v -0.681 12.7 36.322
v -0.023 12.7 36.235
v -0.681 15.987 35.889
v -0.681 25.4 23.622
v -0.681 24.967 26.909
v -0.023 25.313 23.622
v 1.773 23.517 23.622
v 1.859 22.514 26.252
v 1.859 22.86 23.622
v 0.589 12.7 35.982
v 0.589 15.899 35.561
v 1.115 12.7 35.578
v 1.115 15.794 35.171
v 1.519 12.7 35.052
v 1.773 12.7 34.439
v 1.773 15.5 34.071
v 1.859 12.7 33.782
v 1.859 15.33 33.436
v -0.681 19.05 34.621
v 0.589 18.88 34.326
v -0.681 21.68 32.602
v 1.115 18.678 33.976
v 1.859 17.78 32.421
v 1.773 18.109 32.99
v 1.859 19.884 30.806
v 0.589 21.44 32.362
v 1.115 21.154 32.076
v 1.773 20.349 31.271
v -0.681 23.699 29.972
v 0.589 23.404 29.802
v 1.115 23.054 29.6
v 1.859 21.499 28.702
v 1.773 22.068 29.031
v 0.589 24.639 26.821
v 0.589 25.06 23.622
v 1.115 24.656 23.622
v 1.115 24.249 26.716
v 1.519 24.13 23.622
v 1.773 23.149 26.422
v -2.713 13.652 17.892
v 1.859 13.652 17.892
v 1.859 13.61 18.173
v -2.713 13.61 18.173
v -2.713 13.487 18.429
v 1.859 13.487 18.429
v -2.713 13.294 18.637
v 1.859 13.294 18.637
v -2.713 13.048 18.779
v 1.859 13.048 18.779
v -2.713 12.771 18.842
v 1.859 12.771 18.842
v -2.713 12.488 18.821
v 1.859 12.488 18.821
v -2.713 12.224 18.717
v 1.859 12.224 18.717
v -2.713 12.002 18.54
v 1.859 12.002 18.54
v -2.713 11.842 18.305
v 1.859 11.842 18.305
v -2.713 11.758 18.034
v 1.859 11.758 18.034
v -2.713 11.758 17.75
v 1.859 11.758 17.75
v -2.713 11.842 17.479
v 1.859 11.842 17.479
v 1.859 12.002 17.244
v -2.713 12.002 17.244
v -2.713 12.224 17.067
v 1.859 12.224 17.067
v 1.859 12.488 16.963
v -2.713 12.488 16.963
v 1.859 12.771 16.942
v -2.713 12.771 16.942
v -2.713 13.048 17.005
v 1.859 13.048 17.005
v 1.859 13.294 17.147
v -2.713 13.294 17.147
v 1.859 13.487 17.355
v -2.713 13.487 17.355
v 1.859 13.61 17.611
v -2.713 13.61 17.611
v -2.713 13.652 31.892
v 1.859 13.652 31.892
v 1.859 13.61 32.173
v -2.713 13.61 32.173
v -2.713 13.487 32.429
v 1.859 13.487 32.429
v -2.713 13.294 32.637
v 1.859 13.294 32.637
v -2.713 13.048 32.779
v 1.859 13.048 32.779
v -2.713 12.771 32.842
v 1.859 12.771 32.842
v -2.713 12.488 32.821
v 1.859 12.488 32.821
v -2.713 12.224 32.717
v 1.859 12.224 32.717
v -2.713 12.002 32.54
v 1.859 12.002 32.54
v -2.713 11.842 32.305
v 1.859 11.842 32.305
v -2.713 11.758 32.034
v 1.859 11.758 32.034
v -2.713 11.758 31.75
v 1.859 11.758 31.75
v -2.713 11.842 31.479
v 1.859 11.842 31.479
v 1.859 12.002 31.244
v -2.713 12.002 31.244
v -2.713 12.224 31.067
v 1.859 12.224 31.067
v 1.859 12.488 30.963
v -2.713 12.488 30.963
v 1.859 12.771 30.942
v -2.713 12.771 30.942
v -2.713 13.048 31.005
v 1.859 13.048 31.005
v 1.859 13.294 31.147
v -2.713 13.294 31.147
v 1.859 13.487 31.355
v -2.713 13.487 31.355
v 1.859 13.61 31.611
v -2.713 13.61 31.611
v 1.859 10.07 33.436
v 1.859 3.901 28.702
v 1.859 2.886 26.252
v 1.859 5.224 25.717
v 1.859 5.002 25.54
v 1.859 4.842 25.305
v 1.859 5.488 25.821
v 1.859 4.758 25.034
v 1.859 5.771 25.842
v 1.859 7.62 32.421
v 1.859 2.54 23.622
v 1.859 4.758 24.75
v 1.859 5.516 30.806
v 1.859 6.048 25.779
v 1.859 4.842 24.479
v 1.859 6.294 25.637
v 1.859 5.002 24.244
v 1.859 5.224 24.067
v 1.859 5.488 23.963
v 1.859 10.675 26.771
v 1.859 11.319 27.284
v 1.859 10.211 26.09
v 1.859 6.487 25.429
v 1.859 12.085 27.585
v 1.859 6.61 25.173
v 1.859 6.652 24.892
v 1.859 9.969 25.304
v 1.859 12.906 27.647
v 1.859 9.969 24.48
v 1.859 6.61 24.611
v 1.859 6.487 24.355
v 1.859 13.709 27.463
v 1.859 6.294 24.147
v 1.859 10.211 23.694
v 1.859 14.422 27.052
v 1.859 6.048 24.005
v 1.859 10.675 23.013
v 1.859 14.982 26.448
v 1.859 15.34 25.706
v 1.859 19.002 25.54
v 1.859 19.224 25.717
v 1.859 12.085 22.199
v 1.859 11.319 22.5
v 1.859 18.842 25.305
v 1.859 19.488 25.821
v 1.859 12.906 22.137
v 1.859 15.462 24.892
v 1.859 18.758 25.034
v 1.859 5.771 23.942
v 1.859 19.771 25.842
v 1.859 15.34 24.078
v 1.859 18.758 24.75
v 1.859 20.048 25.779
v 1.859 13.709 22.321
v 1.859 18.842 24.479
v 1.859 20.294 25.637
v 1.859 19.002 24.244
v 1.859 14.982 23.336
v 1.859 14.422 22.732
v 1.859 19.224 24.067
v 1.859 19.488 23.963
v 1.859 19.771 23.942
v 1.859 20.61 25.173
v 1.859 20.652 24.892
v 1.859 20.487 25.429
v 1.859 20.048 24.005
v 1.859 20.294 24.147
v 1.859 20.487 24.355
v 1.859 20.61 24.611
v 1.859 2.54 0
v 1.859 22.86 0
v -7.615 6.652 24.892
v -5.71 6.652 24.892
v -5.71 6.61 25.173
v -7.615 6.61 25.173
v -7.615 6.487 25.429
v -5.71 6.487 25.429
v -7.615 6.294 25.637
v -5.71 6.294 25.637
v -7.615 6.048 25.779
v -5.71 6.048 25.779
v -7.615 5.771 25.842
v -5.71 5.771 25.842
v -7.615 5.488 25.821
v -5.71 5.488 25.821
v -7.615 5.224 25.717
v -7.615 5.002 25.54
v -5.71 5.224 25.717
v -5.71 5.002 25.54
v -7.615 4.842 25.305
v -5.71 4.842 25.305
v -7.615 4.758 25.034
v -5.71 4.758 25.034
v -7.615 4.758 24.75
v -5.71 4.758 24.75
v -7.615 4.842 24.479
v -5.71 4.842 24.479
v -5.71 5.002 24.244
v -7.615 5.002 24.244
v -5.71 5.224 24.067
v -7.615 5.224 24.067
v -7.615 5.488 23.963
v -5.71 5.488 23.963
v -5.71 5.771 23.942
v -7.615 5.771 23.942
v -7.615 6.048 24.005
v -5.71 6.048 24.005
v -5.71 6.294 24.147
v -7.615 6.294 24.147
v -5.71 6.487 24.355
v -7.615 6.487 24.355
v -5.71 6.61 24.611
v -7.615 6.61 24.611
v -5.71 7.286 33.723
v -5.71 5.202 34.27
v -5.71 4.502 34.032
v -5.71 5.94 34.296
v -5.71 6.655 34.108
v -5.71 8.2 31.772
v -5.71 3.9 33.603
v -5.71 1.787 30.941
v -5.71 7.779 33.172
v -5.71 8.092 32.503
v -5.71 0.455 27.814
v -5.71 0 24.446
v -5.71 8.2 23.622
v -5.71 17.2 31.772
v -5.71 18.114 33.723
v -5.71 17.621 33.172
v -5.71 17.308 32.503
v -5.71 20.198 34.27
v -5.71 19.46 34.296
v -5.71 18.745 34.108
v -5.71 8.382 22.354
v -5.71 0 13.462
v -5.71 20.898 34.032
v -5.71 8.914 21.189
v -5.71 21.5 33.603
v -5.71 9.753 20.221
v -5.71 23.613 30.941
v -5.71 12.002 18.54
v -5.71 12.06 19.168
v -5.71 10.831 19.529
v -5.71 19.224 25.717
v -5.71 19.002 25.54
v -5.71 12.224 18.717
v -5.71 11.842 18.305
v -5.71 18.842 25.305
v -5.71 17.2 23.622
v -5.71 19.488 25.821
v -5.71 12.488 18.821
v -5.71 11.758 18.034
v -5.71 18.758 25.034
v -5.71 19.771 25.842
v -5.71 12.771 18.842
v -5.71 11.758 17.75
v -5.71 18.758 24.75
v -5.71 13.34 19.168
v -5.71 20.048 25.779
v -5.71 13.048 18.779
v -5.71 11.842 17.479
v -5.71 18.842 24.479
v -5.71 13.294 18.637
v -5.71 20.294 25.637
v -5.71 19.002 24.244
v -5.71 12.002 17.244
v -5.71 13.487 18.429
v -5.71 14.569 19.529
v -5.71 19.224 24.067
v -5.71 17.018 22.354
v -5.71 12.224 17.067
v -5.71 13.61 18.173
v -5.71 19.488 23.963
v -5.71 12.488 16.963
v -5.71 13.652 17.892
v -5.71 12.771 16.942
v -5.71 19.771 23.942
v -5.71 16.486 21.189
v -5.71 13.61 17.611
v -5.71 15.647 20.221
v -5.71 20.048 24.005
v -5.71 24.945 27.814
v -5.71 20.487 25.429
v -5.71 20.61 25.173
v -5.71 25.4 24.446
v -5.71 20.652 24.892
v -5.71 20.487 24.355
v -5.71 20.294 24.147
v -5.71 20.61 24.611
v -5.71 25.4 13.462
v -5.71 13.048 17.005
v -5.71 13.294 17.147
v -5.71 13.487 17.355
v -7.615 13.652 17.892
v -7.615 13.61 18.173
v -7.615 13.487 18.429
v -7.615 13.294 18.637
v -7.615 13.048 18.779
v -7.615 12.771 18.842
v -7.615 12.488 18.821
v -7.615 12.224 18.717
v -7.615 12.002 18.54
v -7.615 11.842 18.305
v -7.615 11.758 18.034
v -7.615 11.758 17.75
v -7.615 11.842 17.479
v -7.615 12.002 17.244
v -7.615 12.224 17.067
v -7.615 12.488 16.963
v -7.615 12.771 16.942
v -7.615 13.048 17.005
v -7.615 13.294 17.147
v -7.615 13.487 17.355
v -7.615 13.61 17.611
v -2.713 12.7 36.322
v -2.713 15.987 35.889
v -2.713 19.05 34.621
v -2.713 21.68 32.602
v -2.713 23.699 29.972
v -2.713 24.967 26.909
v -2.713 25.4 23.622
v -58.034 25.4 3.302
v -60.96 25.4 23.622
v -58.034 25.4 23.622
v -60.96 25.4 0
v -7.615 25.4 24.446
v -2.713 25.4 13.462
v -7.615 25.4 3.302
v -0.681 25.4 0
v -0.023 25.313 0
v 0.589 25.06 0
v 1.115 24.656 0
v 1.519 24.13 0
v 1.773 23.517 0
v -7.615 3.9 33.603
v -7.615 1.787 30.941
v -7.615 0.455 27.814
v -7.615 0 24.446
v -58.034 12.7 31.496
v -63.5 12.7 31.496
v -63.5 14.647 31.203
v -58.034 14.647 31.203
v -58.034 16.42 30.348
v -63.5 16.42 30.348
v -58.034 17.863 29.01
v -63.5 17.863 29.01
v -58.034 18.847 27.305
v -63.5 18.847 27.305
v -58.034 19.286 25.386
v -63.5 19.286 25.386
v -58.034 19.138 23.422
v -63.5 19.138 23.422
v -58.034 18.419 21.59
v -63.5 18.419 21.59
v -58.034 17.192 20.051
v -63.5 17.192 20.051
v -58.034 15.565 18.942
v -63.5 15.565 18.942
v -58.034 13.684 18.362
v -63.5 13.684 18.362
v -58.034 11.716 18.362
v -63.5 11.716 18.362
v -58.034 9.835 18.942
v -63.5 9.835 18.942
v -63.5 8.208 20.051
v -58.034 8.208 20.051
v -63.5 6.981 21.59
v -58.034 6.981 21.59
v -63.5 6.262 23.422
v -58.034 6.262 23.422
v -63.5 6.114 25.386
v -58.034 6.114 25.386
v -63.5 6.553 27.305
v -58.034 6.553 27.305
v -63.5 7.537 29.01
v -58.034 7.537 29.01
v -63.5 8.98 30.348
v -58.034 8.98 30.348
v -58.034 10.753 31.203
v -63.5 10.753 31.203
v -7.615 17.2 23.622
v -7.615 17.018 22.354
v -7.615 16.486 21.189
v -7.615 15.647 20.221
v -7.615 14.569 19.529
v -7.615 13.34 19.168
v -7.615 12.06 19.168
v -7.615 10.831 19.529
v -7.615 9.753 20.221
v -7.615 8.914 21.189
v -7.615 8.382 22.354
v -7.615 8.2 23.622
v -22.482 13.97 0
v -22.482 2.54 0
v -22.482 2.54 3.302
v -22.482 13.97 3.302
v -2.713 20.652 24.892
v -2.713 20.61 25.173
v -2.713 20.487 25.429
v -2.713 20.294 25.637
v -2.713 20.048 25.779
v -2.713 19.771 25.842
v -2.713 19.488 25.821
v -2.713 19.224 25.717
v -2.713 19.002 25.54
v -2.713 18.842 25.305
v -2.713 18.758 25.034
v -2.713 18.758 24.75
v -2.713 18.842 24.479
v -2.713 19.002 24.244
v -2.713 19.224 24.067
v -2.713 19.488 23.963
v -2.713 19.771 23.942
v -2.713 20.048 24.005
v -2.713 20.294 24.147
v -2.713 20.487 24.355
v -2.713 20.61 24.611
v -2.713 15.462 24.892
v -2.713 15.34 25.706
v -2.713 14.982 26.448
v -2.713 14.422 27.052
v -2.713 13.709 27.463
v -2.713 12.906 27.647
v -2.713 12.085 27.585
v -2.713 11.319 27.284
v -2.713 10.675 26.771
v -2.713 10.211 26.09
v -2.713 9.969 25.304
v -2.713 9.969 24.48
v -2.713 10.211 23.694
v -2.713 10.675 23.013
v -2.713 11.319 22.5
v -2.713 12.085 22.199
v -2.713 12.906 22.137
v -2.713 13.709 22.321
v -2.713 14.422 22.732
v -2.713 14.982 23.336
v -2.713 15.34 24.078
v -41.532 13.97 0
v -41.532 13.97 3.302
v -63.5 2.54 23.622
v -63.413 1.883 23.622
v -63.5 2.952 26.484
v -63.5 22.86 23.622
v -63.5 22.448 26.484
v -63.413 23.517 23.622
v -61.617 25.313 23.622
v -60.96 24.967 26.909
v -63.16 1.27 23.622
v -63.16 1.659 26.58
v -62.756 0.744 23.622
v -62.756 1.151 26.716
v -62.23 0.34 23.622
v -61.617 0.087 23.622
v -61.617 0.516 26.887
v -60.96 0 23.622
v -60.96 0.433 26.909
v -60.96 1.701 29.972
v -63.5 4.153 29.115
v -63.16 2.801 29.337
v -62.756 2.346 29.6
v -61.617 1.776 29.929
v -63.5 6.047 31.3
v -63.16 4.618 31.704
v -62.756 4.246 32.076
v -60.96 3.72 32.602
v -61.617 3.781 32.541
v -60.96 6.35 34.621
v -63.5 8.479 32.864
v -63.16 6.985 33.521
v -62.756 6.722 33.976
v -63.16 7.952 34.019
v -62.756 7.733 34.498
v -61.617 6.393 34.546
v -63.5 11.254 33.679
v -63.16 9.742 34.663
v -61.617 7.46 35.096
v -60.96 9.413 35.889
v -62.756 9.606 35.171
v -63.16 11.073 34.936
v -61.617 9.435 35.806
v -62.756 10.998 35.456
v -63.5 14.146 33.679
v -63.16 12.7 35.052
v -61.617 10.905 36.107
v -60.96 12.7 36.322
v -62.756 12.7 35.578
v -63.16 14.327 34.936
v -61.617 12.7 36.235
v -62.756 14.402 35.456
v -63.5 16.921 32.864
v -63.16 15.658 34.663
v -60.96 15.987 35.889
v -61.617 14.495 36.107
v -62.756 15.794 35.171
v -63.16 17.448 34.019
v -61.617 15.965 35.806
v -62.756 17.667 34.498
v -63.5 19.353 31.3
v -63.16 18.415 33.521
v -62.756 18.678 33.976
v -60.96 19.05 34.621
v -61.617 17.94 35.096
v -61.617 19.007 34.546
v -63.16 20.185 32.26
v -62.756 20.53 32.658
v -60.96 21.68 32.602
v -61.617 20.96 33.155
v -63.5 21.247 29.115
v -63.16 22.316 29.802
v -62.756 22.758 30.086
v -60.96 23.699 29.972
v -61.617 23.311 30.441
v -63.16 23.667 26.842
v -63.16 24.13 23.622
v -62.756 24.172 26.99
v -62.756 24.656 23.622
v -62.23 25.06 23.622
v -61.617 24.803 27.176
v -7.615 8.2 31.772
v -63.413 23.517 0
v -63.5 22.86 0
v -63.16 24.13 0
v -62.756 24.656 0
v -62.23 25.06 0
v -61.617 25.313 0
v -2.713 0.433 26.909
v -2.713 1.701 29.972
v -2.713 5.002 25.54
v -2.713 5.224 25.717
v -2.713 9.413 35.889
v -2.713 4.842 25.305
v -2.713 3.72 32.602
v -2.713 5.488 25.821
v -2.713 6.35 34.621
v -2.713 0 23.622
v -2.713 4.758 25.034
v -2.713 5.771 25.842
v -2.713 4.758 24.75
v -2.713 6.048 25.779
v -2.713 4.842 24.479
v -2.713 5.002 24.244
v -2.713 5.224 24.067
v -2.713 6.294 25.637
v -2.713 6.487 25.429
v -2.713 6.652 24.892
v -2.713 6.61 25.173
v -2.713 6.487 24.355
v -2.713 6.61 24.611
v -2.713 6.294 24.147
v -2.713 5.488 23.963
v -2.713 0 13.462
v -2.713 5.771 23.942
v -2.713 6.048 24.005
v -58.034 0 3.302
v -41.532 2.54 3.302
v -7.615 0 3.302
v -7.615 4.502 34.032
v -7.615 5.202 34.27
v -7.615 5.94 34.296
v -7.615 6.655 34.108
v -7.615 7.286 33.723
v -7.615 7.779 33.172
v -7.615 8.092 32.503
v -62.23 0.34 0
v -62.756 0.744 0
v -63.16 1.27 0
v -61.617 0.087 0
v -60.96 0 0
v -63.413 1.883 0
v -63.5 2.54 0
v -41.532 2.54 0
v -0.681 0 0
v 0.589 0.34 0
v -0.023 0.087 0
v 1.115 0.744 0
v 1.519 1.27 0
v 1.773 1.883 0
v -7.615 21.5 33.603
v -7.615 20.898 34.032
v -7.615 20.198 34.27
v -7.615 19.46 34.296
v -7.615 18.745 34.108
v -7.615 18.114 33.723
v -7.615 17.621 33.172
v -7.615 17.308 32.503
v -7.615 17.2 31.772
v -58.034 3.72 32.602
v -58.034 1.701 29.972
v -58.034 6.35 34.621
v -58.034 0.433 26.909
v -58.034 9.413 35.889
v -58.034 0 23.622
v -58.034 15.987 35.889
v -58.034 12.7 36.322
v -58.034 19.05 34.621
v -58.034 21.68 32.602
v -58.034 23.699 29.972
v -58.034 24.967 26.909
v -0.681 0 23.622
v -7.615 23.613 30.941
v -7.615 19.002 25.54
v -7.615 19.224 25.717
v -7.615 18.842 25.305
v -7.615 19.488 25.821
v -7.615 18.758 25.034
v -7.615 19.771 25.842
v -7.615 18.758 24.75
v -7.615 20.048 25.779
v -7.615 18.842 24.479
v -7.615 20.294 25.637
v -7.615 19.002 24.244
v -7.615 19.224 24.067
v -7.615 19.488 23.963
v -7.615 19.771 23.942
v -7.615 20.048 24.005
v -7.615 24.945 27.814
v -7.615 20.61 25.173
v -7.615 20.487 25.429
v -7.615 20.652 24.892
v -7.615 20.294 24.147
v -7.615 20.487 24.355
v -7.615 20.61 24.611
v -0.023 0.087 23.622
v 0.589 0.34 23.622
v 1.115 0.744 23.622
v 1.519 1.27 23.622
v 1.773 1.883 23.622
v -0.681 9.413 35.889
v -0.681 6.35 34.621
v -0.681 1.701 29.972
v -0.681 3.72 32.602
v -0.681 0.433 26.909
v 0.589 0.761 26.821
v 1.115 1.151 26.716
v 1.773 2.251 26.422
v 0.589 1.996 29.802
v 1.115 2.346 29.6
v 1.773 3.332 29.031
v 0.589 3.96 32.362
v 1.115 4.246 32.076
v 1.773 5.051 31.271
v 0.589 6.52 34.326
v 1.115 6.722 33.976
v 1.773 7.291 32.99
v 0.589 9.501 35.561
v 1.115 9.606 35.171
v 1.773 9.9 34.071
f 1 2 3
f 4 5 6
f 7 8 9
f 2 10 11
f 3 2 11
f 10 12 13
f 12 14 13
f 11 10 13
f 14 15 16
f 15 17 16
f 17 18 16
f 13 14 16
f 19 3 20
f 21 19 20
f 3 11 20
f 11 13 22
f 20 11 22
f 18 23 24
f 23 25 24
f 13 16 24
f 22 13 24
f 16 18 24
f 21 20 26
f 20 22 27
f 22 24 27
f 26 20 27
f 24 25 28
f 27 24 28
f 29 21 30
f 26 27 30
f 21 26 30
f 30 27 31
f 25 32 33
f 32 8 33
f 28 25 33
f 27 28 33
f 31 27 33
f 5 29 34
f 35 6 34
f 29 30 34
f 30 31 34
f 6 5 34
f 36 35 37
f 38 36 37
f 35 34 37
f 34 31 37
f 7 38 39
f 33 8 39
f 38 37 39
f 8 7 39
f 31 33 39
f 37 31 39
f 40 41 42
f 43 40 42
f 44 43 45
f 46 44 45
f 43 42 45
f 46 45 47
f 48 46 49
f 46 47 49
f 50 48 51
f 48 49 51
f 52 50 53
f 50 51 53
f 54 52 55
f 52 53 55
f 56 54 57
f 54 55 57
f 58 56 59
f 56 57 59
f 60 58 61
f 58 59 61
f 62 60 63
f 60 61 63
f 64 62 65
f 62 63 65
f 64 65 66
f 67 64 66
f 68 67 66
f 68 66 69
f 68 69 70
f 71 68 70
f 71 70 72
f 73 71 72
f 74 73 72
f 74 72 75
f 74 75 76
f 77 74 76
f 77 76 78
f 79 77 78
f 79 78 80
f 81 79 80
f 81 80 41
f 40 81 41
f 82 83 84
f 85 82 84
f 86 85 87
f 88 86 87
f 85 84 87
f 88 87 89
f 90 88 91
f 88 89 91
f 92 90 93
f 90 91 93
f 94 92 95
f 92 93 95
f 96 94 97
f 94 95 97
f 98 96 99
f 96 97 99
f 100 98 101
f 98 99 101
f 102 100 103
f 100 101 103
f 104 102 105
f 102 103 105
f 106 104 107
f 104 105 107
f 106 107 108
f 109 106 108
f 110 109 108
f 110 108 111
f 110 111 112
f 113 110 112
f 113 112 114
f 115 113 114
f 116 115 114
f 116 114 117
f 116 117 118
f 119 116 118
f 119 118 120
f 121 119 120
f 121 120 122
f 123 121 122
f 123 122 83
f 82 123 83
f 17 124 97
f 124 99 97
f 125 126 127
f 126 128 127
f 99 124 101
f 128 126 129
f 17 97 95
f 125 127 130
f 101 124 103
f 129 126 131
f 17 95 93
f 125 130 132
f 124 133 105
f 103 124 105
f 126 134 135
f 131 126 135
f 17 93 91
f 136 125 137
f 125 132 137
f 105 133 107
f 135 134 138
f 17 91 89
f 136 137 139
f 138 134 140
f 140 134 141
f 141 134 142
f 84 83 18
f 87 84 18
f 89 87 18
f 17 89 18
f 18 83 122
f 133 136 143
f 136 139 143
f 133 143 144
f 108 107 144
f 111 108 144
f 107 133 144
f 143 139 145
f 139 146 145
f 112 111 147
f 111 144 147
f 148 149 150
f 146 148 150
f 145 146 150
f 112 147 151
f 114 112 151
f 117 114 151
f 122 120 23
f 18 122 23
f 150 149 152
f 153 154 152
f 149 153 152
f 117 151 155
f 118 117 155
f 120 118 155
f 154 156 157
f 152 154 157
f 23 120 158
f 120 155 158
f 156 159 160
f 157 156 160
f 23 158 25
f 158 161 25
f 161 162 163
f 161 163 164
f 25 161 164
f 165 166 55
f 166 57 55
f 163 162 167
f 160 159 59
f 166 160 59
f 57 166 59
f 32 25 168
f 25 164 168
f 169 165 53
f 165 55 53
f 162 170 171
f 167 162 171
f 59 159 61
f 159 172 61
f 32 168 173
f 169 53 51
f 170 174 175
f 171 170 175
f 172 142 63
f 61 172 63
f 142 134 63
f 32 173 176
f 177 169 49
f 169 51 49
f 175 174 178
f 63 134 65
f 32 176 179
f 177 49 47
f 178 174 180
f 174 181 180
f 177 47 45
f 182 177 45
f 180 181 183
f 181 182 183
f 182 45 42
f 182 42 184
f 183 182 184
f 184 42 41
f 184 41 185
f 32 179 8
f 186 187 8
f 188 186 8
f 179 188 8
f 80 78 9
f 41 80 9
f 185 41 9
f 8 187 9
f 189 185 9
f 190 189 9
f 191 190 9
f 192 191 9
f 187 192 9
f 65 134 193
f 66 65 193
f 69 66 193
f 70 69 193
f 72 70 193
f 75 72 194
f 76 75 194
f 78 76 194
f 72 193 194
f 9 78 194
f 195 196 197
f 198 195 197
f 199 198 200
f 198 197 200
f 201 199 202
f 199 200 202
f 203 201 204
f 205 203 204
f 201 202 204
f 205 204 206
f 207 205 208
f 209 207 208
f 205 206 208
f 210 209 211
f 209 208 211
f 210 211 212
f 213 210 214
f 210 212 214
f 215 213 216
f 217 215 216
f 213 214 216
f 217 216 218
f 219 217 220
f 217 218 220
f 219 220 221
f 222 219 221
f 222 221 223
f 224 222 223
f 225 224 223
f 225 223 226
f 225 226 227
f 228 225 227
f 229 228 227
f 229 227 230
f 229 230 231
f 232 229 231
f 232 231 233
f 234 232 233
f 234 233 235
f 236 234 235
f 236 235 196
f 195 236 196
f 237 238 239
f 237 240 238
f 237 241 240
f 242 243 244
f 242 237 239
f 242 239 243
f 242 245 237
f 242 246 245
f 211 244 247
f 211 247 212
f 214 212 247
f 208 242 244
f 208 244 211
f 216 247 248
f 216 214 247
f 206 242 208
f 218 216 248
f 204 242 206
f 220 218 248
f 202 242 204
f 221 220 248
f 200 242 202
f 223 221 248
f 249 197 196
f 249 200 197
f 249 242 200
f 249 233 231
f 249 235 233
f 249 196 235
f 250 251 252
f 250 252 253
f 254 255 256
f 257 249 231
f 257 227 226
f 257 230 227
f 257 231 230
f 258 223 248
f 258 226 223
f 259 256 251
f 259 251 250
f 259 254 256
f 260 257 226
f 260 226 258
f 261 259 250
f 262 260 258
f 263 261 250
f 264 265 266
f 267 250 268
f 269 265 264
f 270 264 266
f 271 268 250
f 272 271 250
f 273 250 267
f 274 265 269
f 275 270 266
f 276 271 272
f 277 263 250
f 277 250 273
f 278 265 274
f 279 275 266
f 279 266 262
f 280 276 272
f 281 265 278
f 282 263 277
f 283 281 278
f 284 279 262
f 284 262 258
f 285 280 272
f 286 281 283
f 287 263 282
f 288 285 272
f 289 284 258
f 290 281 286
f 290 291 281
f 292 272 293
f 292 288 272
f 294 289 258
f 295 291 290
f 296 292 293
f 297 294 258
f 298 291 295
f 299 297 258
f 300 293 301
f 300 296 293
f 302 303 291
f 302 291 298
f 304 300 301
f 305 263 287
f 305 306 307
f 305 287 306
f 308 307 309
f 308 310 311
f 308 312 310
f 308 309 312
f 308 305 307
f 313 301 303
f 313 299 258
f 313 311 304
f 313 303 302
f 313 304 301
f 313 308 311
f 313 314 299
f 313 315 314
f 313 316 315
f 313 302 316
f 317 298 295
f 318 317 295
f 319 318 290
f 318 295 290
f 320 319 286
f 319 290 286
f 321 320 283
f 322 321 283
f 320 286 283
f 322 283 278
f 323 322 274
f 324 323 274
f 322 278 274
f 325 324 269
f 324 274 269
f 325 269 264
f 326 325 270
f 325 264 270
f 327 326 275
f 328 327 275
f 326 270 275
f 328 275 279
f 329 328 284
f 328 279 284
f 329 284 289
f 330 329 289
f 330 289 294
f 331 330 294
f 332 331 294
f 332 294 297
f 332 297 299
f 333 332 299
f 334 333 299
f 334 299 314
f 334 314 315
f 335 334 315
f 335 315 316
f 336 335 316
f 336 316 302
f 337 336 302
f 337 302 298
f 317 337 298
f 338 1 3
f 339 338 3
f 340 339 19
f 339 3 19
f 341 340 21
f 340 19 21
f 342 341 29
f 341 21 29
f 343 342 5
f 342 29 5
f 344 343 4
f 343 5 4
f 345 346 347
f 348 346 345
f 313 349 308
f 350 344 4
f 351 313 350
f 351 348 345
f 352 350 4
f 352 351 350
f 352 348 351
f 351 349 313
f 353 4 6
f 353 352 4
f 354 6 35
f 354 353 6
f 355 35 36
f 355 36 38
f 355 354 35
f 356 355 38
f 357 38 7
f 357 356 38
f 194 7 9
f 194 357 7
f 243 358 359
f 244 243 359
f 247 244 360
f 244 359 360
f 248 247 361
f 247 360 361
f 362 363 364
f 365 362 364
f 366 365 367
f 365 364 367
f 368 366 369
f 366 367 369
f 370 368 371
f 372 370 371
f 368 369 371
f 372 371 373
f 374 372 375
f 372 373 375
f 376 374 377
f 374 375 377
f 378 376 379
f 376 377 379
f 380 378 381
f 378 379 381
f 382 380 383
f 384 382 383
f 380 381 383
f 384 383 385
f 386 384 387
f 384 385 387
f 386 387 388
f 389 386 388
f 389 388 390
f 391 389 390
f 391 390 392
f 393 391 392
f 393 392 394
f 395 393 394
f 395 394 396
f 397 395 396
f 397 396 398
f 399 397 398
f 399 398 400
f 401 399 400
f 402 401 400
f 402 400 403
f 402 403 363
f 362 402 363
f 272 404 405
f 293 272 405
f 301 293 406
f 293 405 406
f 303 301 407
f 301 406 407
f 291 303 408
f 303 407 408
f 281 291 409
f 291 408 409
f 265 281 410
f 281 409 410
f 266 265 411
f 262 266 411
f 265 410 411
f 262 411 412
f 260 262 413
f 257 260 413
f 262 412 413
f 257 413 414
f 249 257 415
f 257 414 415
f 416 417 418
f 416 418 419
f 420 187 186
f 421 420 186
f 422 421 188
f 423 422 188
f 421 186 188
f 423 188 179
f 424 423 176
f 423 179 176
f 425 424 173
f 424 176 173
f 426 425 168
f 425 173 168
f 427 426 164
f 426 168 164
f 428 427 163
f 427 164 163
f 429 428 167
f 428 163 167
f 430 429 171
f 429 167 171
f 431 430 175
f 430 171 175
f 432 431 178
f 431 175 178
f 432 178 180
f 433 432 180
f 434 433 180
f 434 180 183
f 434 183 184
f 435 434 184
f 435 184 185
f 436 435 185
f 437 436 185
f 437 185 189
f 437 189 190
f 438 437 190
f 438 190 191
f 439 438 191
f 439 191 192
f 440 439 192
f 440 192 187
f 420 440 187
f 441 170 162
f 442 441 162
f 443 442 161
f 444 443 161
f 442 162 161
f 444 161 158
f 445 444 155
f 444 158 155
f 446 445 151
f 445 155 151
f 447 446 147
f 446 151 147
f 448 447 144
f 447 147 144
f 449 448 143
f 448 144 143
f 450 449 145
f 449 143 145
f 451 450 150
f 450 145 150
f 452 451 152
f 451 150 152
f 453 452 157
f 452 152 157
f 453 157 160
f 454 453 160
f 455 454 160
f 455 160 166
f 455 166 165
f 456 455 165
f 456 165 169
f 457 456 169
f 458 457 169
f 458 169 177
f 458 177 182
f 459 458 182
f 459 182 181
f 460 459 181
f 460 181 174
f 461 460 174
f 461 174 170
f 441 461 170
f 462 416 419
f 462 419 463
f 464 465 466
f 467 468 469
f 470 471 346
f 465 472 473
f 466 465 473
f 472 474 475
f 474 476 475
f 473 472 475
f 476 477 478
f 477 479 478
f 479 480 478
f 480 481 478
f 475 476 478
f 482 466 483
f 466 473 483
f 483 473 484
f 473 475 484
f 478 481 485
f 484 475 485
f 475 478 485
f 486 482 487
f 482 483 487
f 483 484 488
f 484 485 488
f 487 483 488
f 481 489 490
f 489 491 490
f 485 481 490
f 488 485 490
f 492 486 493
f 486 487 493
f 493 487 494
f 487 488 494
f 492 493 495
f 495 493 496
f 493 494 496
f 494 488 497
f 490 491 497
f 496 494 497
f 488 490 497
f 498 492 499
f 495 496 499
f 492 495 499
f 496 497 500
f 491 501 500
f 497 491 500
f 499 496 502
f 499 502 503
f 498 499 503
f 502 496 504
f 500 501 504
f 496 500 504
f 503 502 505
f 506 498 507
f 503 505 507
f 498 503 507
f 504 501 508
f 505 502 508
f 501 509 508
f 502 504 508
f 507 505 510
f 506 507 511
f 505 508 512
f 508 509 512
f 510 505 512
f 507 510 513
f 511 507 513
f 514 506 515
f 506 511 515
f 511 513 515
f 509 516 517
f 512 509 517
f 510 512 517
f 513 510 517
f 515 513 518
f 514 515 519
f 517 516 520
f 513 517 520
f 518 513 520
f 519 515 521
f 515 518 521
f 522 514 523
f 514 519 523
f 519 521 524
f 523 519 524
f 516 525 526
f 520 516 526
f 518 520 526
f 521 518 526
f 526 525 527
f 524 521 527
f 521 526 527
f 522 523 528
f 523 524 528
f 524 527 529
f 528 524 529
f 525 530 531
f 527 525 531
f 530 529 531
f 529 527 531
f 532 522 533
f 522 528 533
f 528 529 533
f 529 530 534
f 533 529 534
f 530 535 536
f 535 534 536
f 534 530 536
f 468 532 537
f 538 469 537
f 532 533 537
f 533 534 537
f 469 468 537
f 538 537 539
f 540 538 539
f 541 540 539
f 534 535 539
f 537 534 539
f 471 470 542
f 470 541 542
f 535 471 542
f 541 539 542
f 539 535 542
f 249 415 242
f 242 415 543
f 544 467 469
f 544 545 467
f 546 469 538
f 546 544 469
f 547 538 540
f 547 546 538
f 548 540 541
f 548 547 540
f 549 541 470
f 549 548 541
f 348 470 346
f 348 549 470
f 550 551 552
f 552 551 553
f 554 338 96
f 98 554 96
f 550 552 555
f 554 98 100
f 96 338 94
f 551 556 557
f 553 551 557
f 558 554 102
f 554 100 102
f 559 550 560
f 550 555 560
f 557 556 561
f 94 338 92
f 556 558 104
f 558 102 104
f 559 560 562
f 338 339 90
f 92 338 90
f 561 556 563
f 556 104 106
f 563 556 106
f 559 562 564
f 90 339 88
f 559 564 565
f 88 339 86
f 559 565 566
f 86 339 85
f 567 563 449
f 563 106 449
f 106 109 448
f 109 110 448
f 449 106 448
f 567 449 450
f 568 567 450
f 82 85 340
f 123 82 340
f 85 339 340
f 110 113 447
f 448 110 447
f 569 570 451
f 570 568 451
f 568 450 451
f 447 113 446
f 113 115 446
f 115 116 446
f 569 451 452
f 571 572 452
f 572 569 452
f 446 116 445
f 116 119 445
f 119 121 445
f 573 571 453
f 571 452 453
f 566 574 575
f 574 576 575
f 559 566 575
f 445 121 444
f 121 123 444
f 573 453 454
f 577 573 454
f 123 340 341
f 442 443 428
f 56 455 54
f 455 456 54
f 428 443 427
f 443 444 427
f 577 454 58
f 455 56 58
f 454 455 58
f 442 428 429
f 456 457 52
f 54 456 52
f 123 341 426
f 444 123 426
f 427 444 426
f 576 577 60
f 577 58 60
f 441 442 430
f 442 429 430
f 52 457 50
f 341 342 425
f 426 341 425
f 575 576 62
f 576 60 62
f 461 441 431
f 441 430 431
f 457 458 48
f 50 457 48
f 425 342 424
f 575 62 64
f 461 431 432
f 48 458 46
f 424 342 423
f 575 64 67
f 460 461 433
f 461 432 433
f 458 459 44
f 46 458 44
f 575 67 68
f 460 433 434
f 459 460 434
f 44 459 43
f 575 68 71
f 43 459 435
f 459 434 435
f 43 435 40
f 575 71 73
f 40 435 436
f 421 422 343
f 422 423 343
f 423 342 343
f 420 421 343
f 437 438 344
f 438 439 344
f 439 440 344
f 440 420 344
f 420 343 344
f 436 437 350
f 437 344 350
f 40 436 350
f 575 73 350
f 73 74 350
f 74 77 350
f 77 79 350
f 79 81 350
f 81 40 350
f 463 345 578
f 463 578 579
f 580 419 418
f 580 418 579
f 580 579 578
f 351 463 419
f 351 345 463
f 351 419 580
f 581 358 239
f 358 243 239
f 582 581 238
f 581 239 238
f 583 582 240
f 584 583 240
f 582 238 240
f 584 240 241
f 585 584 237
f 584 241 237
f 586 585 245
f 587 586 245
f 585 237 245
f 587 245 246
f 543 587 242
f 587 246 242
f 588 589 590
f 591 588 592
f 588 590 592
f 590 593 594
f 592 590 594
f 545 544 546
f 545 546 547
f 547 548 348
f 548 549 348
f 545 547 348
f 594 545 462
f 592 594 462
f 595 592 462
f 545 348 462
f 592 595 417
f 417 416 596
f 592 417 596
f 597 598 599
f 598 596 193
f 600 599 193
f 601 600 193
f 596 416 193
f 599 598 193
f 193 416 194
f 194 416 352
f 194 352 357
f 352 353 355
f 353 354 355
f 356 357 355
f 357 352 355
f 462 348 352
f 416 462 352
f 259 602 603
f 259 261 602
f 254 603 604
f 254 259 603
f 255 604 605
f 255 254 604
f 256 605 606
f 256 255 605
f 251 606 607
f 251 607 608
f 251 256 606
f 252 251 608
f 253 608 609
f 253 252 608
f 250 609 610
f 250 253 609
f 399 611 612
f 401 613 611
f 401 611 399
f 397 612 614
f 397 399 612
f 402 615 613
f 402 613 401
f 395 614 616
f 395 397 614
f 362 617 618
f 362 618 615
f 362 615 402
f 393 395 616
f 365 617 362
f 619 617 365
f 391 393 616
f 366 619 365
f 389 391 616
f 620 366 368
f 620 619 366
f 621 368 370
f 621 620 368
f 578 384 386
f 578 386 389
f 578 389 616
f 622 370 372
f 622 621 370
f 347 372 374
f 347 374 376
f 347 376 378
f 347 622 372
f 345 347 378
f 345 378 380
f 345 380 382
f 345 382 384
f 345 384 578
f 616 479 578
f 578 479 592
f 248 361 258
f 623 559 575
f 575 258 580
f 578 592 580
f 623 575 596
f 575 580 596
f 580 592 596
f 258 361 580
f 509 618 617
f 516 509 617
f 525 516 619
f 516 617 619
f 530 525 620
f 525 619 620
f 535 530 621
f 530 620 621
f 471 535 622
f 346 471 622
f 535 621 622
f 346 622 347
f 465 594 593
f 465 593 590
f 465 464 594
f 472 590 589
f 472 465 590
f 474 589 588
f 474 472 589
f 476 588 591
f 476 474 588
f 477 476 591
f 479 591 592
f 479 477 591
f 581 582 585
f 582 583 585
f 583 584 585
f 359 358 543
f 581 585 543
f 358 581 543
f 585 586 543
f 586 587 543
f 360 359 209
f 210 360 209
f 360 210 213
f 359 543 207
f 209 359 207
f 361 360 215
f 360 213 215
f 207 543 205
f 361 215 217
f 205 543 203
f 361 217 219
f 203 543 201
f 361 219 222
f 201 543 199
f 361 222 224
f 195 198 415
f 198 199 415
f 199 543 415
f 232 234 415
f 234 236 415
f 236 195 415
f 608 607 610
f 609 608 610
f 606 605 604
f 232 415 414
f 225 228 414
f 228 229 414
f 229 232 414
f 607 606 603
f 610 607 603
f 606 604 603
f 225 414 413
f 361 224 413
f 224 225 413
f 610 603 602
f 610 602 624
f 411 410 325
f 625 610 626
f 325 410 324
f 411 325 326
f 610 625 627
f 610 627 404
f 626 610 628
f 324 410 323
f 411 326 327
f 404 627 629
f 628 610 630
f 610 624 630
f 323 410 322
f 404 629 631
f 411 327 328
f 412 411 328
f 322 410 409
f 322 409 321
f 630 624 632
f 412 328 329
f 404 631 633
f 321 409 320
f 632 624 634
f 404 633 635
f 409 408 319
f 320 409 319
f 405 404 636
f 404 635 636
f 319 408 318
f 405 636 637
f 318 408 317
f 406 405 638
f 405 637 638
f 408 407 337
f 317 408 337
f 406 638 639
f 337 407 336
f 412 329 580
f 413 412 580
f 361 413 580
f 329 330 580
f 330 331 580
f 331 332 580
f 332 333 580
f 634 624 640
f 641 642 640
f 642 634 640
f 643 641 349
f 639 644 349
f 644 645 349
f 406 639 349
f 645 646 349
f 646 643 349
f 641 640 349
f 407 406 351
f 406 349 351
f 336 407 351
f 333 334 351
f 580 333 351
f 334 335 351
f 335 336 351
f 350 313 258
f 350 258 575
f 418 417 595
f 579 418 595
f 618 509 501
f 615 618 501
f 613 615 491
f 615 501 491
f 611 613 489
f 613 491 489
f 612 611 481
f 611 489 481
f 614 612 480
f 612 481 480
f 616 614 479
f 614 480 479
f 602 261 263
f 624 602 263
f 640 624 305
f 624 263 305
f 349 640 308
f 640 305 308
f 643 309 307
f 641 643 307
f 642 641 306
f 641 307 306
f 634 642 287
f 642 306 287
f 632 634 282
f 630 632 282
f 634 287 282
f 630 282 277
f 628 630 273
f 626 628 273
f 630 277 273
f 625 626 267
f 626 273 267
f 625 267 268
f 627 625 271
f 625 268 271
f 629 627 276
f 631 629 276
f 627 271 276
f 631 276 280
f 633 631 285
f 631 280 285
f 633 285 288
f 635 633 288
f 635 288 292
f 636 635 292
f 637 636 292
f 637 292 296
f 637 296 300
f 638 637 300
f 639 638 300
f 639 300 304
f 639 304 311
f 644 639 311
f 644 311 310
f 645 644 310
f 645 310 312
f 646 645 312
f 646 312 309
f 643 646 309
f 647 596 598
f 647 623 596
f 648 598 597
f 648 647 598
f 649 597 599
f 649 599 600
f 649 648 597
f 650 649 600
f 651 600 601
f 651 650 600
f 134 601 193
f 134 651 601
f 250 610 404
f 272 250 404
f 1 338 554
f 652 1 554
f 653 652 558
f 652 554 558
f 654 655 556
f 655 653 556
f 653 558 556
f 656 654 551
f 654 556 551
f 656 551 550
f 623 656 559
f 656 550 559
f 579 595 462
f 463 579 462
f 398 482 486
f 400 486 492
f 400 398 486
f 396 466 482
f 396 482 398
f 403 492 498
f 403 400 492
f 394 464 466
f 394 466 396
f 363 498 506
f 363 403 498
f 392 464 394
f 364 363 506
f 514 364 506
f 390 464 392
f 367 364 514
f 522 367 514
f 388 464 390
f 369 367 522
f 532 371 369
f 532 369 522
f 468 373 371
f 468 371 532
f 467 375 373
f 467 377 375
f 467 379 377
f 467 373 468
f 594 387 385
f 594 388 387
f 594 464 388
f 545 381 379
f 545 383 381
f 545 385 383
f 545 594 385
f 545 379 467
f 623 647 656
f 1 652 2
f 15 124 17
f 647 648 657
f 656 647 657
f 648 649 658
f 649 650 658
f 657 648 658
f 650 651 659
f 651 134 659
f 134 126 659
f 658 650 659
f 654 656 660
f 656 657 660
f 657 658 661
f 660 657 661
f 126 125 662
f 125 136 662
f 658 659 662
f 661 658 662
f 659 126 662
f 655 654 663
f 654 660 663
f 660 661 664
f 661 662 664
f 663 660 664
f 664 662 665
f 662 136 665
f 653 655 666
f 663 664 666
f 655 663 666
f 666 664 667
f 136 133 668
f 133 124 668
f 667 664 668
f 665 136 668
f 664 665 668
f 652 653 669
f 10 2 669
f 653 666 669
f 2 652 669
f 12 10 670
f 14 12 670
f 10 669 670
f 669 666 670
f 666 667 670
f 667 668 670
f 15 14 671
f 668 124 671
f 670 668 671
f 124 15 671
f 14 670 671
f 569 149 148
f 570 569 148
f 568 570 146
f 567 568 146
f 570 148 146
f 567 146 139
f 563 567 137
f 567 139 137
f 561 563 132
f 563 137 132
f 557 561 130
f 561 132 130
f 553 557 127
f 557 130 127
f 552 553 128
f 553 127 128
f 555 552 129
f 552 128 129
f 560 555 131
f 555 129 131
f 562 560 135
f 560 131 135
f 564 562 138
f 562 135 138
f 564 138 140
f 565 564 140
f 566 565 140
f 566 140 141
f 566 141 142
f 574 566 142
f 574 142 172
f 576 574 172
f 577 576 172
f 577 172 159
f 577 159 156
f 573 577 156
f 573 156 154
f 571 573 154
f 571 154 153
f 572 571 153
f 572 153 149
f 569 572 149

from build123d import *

# Parameters (mm, degrees)
SKETCH1_W           = 65.359412811
SKETCH1_H           = 25.4
BOSS_EXTRUDE1_DEPTH = 36.322
SKETCH4_W           = 50.419
SKETCH4_H           = 33.02
SKETCH4_W_2         = 2.9972
SKETCH4_H_2         = 22.86
CUT_EXTRUDE1_DEPTH  = 78.438347632
CUT_EXTRUDE2_REACH  = 80.97
SKETCH5_R           = 2.76225
CUT_EXTRUDE3_REACH  = 80.97
SKETCH6_R           = 0.9525
CUT_EXTRUDE5_REACH  = 80.97
SKETCH7_R           = 6.604
SKETCH7_R_2         = 0.9525
CUT_EXTRUDE6_REACH  = 73.327
FILLET1_R           = 12.7
FILLET2_R           = 2.54
SKETCH10_W          = 19.05
SKETCH10_H          = 11.43
CUT_EXTRUDE7_DEPTH  = 78.438347679


with BuildPart() as part:
    # Sketch1 → Boss-Extrude1 (new body)
    with BuildSketch(Plane.XY):
        with Locations((-30.820293595, 12.7)):
            Rectangle(SKETCH1_W, SKETCH1_H)
    extrude(amount=BOSS_EXTRUDE1_DEPTH)

    # Sketch4 → Cut-Extrude1 (cut, through all)
    with BuildSketch(Plane(origin=(0, 25.4, 0), x_dir=(1, 0, 0), z_dir=(0, 1, 0))):
        with Locations((-32.824287189, -19.812)):
            Rectangle(SKETCH4_W, SKETCH4_H)
        with Locations((-4.211187189, -24.892)):
            Rectangle(SKETCH4_W_2, SKETCH4_H_2)
    extrude(amount=-CUT_EXTRUDE1_DEPTH, mode=Mode.SUBTRACT)

    # Sketch5 → Cut-Extrude2 (cut, up to next)
    with BuildSketch(Plane(origin=(1.859412811, 0, 0), x_dir=(0, 0, -1), z_dir=(1, 0, 0)), mode=Mode.PRIVATE) as cut_extrude2_sk1:
        with Locations(Location((-24.892, 12.7, 0), (0, 0, 90))):
            Circle(SKETCH5_R)
    cut_extrude2_tool1 = extrude(cut_extrude2_sk1.sketch, amount=-CUT_EXTRUDE2_REACH, mode=Mode.PRIVATE) & part.part
    add(cut_extrude2_tool1.solids().sort_by_distance((1.859413, 12.7, 24.892))[0], mode=Mode.SUBTRACT)

    # Cut-Extrude3: up to this face of the body (flat: up to its plane)
    cut_extrude3_end = Plane(part.part.faces().sort_by_distance((-7.614787189, 12.7, 19.812))[0])
    # Sketch6 → Cut-Extrude3 (cut, up to the picked face)
    with BuildSketch(Plane(origin=(1.859412811, 0, 0), x_dir=(0, 0, -1), z_dir=(1, 0, 0)), mode=Mode.PRIVATE) as cut_extrude3_sk1:
        with Locations(Location((-24.892, 12.7, 0), (0, 0, 90))):
            Circle(SKETCH6_R)
    cut_extrude3_tool1 = split(extrude(cut_extrude3_sk1.sketch, amount=-CUT_EXTRUDE3_REACH, mode=Mode.PRIVATE), bisect_by=cut_extrude3_end, keep=Keep.BOTH, mode=Mode.PRIVATE)
    # Sketch6 → Cut-Extrude3 (cut, up to the picked face)
    with BuildSketch(Plane(origin=(1.859412811, 0, 0), x_dir=(0, 0, -1), z_dir=(1, 0, 0)), mode=Mode.PRIVATE) as cut_extrude3_sk2:
        with Locations(Location((-24.892, 19.7, 0), (0, 0, 90))):
            Circle(SKETCH6_R)
    cut_extrude3_tool2 = split(extrude(cut_extrude3_sk2.sketch, amount=-CUT_EXTRUDE3_REACH, mode=Mode.PRIVATE), bisect_by=cut_extrude3_end, keep=Keep.BOTH, mode=Mode.PRIVATE)
    # Sketch6 → Cut-Extrude3 (cut, up to the picked face)
    with BuildSketch(Plane(origin=(1.859412811, 0, 0), x_dir=(0, 0, -1), z_dir=(1, 0, 0)), mode=Mode.PRIVATE) as cut_extrude3_sk3:
        with Locations(Location((-17.892, 12.7, 0), (0, 0, 90))):
            Circle(SKETCH6_R)
    cut_extrude3_tool3 = split(extrude(cut_extrude3_sk3.sketch, amount=-CUT_EXTRUDE3_REACH, mode=Mode.PRIVATE), bisect_by=cut_extrude3_end, keep=Keep.BOTH, mode=Mode.PRIVATE)
    # Sketch6 → Cut-Extrude3 (cut, up to the picked face)
    with BuildSketch(Plane(origin=(1.859412811, 0, 0), x_dir=(0, 0, -1), z_dir=(1, 0, 0)), mode=Mode.PRIVATE) as cut_extrude3_sk4:
        with Locations(Location((-24.892, 5.7, 0), (0, 0, 90))):
            Circle(SKETCH6_R)
    cut_extrude3_tool4 = split(extrude(cut_extrude3_sk4.sketch, amount=-CUT_EXTRUDE3_REACH, mode=Mode.PRIVATE), bisect_by=cut_extrude3_end, keep=Keep.BOTH, mode=Mode.PRIVATE)
    # Sketch6 → Cut-Extrude3 (cut, up to the picked face)
    with BuildSketch(Plane(origin=(1.859412811, 0, 0), x_dir=(0, 0, -1), z_dir=(1, 0, 0)), mode=Mode.PRIVATE) as cut_extrude3_sk5:
        with Locations(Location((-31.892, 12.7, 0), (0, 0, 90))):
            Circle(SKETCH6_R)
    cut_extrude3_tool5 = split(extrude(cut_extrude3_sk5.sketch, amount=-CUT_EXTRUDE3_REACH, mode=Mode.PRIVATE), bisect_by=cut_extrude3_end, keep=Keep.BOTH, mode=Mode.PRIVATE)
    add(cut_extrude3_tool1.solids().sort_by(Axis((1.859413, 12.7, 24.892), (-1, 0, 0)))[0], mode=Mode.SUBTRACT)
    add(cut_extrude3_tool2.solids().sort_by(Axis((1.859413, 19.7, 24.892), (-1, 0, 0)))[0], mode=Mode.SUBTRACT)
    add(cut_extrude3_tool3.solids().sort_by(Axis((1.859413, 12.7, 17.892), (-1, 0, 0)))[0], mode=Mode.SUBTRACT)
    add(cut_extrude3_tool4.solids().sort_by(Axis((1.859413, 5.7, 24.892), (-1, 0, 0)))[0], mode=Mode.SUBTRACT)
    add(cut_extrude3_tool5.solids().sort_by(Axis((1.859413, 12.7, 31.892), (-1, 0, 0)))[0], mode=Mode.SUBTRACT)

    # Sketch7 → Cut-Extrude5 (cut, up to next)
    with BuildSketch(Plane.ZY.offset(63.5), mode=Mode.PRIVATE) as cut_extrude5_sk1:
        with Locations((24.892, 12.7)):
            Circle(SKETCH7_R)
        with Locations(Location((24.892, 12.7, 0), (0, 0, 90))):
            Circle(SKETCH7_R_2, mode=Mode.SUBTRACT)
    cut_extrude5_tool1 = extrude(cut_extrude5_sk1.sketch, amount=-CUT_EXTRUDE5_REACH, mode=Mode.PRIVATE) & part.part
    # Sketch7 → Cut-Extrude5 (cut, up to next)
    with BuildSketch(Plane.ZY.offset(63.5), mode=Mode.PRIVATE) as cut_extrude5_sk2:
        with Locations(Location((24.892, 12.7, 0), (0, 0, 90))):
            Circle(SKETCH7_R_2)
    cut_extrude5_tool2 = extrude(cut_extrude5_sk2.sketch, amount=-CUT_EXTRUDE5_REACH, mode=Mode.PRIVATE) & part.part
    add(cut_extrude5_tool1.solids().sort_by_distance((-63.5, 12.7, 18.474789))[0], mode=Mode.SUBTRACT)
    add(cut_extrude5_tool2.solids().sort_by_distance((-63.5, 12.7, 24.892))[0], mode=Mode.SUBTRACT)

    # Sketch8 → Cut-Extrude6 (cut, up to next)
    with BuildSketch(Plane.ZY.offset(7.614787189), mode=Mode.PRIVATE) as cut_extrude6_sk1:
        with BuildLine():
            Line((36.322, 17.2), (23.622, 17.2))
            ThreePointArc((23.622, 17.2), (19.122, 12.7), (23.622, 8.2))
            Line((23.622, 8.2), (36.322, 8.2))
            Line((36.322, 8.2), (36.322, 17.2))
        make_face()
    cut_extrude6_tool1 = extrude(cut_extrude6_sk1.sketch, amount=-CUT_EXTRUDE6_REACH, mode=Mode.PRIVATE) & part.part
    add(cut_extrude6_tool1.solids().sort_by_distance((-7.614787, 12.7, 28.173785))[0], mode=Mode.SUBTRACT)

    # Fillet1
    # the kernel refuses this fillet: 12.7 mm, written as the material it takes off along each edge
    with BuildSketch(Plane(origin=(-63.5, 0, 36.322), x_dir=(0, 0, -1), z_dir=(1, 0, 0))) as fillet1_piece_1:
        with BuildLine():
            CenterArc((FILLET1_R, FILLET1_R), FILLET1_R, 180, 90)
            Line((0, FILLET1_R), (-FILLET1_R * 0.02, FILLET1_R))
            Line((-FILLET1_R * 0.02, FILLET1_R), (-FILLET1_R * 0.02, -FILLET1_R * 0.02))
            Line((-FILLET1_R * 0.02, -FILLET1_R * 0.02), (FILLET1_R, -FILLET1_R * 0.02))
            Line((FILLET1_R, -FILLET1_R * 0.02), (FILLET1_R, 0))
        make_face()
    extrude(amount=5.466212811, mode=Mode.SUBTRACT)
    with BuildSketch(Plane(origin=(-7.614787189, 0, 36.322), x_dir=(0, 0, -1), z_dir=(1, 0, 0)), Plane(origin=(-5.709787189, 25.4, 36.322), x_dir=(0, 0, -1), z_dir=(-1, 0, 0))) as fillet1_piece_2:
        with BuildLine():
            CenterArc((11.876026271, 12.7), FILLET1_R, 200.752430643, 69.247569357)
            Line((0, 8.2), (-0.237520525, 8.11))
            ThreePointArc((-0.237520525, 8.11), (-0.254, 4.1), (-0.254, 0))
            Line((-0.254, 0), (0, -0.254))
            Line((0, -0.254), (11.876026271, -0.254))
            Line((11.876026271, -0.254), (11.876026271, 0))
        make_face()
    extrude(amount=1.905, mode=Mode.SUBTRACT)
    with BuildSketch(Plane(origin=(-2.712587189, 0, 36.322), x_dir=(0, 0, -1), z_dir=(1, 0, 0))) as fillet1_piece_3:
        with BuildLine():
            CenterArc((FILLET1_R, FILLET1_R), FILLET1_R, 180, 90)
            Line((0, FILLET1_R), (-FILLET1_R * 0.02, FILLET1_R))
            Line((-FILLET1_R * 0.02, FILLET1_R), (-FILLET1_R * 0.02, -FILLET1_R * 0.02))
            Line((-FILLET1_R * 0.02, -FILLET1_R * 0.02), (FILLET1_R, -FILLET1_R * 0.02))
            Line((FILLET1_R, -FILLET1_R * 0.02), (FILLET1_R, 0))
        make_face()
    extrude(amount=4.572, mode=Mode.SUBTRACT)
    with BuildSketch(Plane(origin=(1.859412811, 25.4, 36.322), x_dir=(0, -1, 0), z_dir=(-1, 0, 0))) as fillet1_piece_4:
        with BuildLine():
            CenterArc((FILLET1_R, -FILLET1_R), FILLET1_R, 90, 90)
            Line((0, -FILLET1_R), (-FILLET1_R * 0.02, -FILLET1_R))
            Line((-FILLET1_R * 0.02, -FILLET1_R), (-FILLET1_R * 0.02, FILLET1_R * 0.02))
            Line((-FILLET1_R * 0.02, FILLET1_R * 0.02), (FILLET1_R, FILLET1_R * 0.02))
            Line((FILLET1_R, FILLET1_R * 0.02), (FILLET1_R, 0))
        make_face()
    extrude(amount=4.572, mode=Mode.SUBTRACT)
    with BuildSketch(Plane(origin=(-58.033787189, 25.4, 36.322), x_dir=(0, -1, 0), z_dir=(-1, 0, 0))) as fillet1_piece_5:
        with BuildLine():
            CenterArc((FILLET1_R, -FILLET1_R), FILLET1_R, 90, 90)
            Line((0, -FILLET1_R), (-FILLET1_R * 0.02, -FILLET1_R))
            Line((-FILLET1_R * 0.02, -FILLET1_R), (-FILLET1_R * 0.02, FILLET1_R * 0.02))
            Line((-FILLET1_R * 0.02, FILLET1_R * 0.02), (FILLET1_R, FILLET1_R * 0.02))
            Line((FILLET1_R, FILLET1_R * 0.02), (FILLET1_R, 0))
        make_face()
    extrude(amount=5.466212811, mode=Mode.SUBTRACT)

    # Fillet2
    fillet2_edges = [part.edges().sort_by_distance(p)[0] for p in [
        (-6.662287189, 8.2, 36.322),
        (-6.662287189, 17.2, 36.322),
        (-63.5, 0, 11.811),
        (1.859412811, 0, 11.811),
        (-63.5, 25.4, 11.811),
        (-63.5, 21.680256121, 32.602256121),
        (-63.5, 3.719743879, 32.602256121),
        (1.859412811, 25.4, 11.811),
        (1.859412811, 21.680256121, 32.602256121),
        (1.859412811, 3.719743879, 32.602256121),
    ]]
    fillet(fillet2_edges, radius=FILLET2_R)

    # Sketch10 → Cut-Extrude7 (cut, through all)
    with BuildSketch(Plane(origin=(0, 0, 0), x_dir=(-1, 0, 0), z_dir=(0, 0, -1))):
        with Locations((32.007264904, 8.255)):
            Rectangle(SKETCH10_W, SKETCH10_H)
    extrude(amount=-CUT_EXTRUDE7_DEPTH, mode=Mode.SUBTRACT)


solid = part.part
